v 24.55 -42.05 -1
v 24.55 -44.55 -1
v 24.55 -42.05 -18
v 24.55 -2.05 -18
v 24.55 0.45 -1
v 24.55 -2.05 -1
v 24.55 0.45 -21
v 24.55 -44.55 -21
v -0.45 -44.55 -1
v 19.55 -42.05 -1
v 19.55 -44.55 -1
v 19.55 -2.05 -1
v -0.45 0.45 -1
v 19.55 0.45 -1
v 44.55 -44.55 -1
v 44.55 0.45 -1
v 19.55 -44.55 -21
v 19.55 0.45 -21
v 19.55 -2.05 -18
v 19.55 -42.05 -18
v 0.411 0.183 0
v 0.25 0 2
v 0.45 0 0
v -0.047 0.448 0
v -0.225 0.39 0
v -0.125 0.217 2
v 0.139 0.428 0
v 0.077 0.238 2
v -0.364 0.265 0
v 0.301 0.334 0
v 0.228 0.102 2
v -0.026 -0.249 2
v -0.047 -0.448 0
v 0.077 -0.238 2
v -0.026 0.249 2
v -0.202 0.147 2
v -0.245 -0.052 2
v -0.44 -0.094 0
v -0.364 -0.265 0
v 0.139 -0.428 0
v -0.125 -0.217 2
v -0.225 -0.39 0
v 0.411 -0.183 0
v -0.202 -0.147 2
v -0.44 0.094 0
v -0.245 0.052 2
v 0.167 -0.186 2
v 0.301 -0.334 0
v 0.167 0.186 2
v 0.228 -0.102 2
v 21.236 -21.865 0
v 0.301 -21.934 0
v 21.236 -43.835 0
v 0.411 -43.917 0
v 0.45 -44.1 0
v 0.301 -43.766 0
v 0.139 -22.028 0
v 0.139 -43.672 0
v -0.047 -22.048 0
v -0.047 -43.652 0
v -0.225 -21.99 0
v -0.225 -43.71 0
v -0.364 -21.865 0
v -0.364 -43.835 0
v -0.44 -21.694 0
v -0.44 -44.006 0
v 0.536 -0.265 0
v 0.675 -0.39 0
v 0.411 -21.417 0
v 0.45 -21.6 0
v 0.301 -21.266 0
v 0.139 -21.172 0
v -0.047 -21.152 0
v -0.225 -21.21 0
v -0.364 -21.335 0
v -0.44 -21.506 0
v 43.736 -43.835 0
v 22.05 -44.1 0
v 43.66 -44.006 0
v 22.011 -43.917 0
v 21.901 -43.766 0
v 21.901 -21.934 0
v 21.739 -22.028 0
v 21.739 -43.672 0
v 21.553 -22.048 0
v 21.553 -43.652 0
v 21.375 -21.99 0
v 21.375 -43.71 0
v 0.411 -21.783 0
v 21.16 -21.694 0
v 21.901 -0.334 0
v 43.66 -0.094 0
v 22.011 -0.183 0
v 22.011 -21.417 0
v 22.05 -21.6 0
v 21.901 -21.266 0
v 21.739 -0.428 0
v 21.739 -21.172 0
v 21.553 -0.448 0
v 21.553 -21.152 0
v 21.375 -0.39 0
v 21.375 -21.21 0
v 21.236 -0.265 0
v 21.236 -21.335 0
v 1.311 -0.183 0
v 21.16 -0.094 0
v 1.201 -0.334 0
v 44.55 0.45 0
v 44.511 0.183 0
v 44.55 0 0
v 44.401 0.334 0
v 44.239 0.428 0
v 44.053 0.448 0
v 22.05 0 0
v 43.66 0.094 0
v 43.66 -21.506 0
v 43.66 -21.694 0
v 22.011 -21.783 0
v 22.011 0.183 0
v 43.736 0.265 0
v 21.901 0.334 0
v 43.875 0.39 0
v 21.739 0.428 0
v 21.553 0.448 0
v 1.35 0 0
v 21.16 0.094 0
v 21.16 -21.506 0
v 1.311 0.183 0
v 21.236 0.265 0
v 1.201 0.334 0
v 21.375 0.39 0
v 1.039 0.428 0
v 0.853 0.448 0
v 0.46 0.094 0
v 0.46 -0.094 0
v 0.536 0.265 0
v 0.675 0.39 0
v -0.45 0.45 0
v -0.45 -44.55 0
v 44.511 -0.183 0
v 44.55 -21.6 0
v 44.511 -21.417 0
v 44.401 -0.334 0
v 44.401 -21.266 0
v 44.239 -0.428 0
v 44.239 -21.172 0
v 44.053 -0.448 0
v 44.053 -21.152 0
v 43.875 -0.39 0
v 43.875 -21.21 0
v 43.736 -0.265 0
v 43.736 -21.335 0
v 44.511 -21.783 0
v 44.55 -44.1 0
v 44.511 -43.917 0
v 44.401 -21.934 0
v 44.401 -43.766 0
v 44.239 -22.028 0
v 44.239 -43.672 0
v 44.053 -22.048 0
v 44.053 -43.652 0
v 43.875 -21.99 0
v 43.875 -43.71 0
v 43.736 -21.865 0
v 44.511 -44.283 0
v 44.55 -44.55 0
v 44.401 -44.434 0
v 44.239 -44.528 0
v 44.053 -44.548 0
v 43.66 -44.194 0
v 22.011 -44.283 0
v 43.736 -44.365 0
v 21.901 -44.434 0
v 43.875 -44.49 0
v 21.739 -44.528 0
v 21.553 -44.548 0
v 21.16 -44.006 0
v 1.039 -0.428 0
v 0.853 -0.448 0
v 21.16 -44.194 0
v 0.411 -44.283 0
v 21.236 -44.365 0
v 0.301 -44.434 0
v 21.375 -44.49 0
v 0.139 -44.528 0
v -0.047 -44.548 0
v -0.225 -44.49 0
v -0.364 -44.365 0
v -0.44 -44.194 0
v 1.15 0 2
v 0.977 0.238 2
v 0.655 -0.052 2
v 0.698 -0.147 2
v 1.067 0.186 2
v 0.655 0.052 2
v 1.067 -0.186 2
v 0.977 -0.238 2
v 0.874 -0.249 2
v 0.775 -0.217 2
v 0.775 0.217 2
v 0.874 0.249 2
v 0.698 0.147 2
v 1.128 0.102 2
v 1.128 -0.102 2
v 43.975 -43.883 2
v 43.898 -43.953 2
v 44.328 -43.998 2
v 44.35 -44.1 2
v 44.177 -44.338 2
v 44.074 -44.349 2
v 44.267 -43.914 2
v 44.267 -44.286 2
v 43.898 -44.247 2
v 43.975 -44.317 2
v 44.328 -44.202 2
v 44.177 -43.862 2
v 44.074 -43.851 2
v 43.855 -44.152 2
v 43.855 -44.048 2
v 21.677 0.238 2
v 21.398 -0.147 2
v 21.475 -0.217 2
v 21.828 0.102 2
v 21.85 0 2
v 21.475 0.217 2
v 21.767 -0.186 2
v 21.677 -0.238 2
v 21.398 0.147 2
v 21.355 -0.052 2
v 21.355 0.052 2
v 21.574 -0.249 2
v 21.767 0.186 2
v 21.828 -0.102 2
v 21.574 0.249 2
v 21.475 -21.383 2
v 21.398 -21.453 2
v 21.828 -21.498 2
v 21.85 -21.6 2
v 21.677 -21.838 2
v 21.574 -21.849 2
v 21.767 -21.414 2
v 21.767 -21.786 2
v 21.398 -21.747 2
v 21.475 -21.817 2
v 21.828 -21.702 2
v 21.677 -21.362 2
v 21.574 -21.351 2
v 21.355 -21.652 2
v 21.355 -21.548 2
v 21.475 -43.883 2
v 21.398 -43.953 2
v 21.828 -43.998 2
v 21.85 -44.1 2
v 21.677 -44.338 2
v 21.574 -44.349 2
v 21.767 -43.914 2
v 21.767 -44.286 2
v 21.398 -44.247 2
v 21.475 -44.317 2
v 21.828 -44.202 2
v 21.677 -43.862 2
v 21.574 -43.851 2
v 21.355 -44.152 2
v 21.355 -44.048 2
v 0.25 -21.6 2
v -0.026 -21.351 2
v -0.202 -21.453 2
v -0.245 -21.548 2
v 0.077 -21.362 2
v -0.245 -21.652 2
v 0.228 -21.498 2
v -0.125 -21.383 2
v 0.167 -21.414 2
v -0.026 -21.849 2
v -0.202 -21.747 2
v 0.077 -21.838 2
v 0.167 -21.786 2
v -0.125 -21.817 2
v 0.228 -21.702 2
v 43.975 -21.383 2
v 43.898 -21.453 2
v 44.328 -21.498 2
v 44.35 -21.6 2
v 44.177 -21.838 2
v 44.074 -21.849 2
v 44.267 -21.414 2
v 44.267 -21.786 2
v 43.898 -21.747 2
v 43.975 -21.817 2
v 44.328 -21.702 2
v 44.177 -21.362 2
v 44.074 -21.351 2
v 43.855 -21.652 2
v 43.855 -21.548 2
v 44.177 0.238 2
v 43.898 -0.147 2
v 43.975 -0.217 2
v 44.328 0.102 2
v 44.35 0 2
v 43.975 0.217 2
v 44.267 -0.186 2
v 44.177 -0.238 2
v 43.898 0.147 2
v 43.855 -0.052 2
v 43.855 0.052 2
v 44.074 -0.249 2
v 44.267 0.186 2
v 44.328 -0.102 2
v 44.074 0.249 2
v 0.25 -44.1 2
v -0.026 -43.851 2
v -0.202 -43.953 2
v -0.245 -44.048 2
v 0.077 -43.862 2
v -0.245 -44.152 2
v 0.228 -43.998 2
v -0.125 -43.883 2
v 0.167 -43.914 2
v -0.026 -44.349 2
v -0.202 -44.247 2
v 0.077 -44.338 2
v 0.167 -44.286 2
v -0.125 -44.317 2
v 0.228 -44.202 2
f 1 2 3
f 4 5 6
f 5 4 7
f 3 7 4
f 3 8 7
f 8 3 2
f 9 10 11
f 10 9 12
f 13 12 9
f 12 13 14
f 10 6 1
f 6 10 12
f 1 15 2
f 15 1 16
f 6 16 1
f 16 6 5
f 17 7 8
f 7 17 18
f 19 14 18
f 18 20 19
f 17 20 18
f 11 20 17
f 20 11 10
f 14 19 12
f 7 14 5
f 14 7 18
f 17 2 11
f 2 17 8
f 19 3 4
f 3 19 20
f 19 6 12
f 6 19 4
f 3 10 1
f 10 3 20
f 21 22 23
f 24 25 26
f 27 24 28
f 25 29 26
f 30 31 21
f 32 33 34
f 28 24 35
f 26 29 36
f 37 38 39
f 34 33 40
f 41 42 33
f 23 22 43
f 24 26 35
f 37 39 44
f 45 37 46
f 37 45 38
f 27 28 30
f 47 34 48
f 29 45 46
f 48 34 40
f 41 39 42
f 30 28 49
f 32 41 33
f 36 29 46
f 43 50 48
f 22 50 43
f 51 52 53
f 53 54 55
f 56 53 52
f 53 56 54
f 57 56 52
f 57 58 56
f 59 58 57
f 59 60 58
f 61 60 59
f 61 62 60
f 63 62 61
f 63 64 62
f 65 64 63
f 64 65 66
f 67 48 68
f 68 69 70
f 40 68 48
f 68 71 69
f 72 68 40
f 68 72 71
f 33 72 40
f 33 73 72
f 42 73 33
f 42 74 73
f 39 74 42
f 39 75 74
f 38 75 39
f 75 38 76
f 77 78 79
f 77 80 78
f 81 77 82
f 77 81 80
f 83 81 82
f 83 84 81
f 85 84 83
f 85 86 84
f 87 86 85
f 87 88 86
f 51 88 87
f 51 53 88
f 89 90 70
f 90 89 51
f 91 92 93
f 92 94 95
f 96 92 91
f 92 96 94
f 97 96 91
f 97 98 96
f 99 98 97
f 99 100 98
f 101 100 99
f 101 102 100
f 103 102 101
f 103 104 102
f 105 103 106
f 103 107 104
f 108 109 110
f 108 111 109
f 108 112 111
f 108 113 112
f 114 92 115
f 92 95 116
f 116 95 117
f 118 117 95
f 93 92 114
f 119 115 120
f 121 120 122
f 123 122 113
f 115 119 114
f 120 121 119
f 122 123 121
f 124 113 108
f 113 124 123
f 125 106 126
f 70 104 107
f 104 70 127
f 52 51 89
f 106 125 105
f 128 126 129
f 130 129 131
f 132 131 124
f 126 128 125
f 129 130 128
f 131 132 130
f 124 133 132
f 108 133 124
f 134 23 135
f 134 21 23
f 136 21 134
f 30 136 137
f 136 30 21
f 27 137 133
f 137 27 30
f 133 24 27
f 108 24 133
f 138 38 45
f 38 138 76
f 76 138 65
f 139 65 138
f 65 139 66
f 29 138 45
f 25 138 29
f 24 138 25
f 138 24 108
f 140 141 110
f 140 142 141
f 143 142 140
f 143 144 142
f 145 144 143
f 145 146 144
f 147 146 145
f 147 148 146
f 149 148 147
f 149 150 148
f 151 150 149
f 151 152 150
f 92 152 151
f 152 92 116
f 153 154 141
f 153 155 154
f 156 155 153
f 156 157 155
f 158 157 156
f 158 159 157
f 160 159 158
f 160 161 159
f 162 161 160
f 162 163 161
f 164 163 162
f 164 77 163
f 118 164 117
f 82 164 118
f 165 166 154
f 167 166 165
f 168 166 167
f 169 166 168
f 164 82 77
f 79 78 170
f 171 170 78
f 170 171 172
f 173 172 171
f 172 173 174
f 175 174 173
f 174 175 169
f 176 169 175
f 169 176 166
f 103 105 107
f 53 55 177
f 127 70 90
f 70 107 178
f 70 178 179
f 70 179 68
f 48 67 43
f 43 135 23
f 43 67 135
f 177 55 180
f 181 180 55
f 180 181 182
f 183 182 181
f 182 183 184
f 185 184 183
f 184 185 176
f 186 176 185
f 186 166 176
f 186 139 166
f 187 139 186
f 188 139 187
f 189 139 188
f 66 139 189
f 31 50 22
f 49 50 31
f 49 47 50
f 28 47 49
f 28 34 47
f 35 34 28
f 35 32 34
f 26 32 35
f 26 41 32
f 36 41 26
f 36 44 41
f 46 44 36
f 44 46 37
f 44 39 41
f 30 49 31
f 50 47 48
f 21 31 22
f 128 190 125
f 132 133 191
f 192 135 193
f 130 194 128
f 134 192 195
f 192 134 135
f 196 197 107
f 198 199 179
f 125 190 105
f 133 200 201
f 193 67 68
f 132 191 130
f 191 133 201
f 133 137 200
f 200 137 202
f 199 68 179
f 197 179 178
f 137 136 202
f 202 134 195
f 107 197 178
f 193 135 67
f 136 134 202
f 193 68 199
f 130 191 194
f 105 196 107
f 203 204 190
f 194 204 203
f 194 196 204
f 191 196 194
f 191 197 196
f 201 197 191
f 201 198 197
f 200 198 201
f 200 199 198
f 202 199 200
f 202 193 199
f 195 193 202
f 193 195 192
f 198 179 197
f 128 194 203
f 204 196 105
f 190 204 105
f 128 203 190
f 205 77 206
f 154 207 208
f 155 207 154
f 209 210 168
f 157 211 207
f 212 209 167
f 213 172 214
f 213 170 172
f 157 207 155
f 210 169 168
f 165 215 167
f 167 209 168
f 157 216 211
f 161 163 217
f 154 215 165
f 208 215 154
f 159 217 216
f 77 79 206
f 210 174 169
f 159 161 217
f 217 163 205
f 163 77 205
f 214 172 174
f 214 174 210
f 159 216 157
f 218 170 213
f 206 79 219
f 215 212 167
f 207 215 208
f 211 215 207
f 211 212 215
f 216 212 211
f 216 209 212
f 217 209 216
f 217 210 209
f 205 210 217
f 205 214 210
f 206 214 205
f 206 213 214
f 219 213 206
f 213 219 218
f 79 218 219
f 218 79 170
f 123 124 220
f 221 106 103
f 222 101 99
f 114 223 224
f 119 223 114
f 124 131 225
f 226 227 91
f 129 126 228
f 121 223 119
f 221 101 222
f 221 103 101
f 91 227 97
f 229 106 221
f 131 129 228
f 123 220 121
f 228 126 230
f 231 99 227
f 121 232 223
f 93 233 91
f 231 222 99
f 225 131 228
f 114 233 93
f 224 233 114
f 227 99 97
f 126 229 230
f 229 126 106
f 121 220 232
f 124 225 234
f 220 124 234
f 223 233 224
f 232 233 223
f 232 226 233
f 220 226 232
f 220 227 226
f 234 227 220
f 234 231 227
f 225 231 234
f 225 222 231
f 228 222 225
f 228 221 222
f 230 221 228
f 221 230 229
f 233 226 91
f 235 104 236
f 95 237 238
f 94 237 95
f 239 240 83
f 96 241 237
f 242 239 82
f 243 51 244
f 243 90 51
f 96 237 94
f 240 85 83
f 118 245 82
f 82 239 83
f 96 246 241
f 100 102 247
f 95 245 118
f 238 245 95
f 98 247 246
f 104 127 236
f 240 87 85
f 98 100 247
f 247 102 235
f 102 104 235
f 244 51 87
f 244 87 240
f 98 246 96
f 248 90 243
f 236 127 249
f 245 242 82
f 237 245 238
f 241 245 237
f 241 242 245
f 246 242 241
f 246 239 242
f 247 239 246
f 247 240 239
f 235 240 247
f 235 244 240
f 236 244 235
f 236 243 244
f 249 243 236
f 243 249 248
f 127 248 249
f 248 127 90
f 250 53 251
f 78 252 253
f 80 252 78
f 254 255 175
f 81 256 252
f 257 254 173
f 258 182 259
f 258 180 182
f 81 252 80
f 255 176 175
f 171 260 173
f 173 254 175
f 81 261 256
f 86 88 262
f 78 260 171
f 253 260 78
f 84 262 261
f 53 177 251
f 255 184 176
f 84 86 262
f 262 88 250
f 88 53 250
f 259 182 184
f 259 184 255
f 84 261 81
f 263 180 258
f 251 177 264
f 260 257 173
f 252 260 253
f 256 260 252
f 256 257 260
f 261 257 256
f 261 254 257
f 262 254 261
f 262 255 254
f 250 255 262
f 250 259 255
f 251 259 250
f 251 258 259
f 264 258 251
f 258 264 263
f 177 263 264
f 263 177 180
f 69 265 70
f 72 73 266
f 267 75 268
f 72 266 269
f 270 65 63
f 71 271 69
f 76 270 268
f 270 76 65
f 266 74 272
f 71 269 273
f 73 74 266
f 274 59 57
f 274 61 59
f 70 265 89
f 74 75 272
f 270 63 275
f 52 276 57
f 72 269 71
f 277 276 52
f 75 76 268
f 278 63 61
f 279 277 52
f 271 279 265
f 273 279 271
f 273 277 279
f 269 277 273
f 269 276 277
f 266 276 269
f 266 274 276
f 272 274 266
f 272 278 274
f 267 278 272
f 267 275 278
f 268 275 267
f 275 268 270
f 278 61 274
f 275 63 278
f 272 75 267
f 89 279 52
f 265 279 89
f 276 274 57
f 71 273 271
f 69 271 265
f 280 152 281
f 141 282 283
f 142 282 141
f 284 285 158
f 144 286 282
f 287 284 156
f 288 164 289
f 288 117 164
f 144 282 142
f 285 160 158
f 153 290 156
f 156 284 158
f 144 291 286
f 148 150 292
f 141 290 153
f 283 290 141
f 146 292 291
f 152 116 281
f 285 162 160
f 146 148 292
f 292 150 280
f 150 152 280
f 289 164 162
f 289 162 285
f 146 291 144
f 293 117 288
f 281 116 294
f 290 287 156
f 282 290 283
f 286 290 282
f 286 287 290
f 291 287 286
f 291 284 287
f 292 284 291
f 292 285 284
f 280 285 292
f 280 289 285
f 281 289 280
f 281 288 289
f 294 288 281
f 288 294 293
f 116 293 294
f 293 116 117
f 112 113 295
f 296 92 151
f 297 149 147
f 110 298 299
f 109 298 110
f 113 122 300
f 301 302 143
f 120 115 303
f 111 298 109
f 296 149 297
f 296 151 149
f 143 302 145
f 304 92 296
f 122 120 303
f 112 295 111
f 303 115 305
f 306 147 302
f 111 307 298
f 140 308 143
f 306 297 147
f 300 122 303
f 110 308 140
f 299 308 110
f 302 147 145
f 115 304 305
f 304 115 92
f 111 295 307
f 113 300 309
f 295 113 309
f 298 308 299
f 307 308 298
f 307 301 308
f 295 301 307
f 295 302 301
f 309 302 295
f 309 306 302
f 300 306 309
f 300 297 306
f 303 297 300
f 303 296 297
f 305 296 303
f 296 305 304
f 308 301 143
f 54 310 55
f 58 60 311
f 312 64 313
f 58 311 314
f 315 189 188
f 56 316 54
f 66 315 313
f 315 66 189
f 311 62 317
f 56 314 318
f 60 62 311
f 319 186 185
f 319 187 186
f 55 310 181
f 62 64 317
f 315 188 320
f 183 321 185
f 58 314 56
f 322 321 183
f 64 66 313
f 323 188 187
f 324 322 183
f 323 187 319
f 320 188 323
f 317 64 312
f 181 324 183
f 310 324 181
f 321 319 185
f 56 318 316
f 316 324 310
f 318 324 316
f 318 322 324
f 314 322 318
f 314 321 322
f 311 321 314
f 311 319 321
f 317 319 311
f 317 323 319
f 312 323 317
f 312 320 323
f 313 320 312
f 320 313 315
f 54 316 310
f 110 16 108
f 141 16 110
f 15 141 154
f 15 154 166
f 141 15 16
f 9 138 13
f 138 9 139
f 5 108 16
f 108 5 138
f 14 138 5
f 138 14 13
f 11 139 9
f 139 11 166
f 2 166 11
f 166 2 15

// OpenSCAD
$fn=15;
gridLength = 45;
gridSquares = 50;
oneGridLength = gridLength / gridSquares;
platformThickness = 1;
handleThickness = 5;
handleHeight = 20;

module buildPlatform(){
  translate([22.05,-22.05, -0.5 * platformThickness])
  cube([45,45,platformThickness], center = true);  
    
}

module buildHandle(){
    translate([22.05,-22.05,-0.5 * handleHeight - platformThickness])
    difference(){
        cube([handleThickness, 45, handleHeight], center = true);
        translate([0,0,4])
        cube([handleThickness + 1, 40, 22], center = true);
    }
    
    
}

module buildStamp(coordinates){
  buildPlatform();
  buildHandle();
  
  for (i=[0:1:len(coordinates) - 1]){
    coordinate = coordinates[i];
    rowNumber = coordinate[0];
    columnNumber = coordinate[1];
    translate([columnNumber * oneGridLength,rowNumber * -1 * oneGridLength,0])
        cylinder(h=2,d1=oneGridLength, d2 = 0.5);
      
  }
    
}

//Coordinates example: 
buildStamp(sender_coordinates);

sender_coordinates = [[0,0], [0,1], [49,49], [0, 24], [24, 24], [49, 24], [24, 0], [24, 49], [0, 49], [49, 0]];
